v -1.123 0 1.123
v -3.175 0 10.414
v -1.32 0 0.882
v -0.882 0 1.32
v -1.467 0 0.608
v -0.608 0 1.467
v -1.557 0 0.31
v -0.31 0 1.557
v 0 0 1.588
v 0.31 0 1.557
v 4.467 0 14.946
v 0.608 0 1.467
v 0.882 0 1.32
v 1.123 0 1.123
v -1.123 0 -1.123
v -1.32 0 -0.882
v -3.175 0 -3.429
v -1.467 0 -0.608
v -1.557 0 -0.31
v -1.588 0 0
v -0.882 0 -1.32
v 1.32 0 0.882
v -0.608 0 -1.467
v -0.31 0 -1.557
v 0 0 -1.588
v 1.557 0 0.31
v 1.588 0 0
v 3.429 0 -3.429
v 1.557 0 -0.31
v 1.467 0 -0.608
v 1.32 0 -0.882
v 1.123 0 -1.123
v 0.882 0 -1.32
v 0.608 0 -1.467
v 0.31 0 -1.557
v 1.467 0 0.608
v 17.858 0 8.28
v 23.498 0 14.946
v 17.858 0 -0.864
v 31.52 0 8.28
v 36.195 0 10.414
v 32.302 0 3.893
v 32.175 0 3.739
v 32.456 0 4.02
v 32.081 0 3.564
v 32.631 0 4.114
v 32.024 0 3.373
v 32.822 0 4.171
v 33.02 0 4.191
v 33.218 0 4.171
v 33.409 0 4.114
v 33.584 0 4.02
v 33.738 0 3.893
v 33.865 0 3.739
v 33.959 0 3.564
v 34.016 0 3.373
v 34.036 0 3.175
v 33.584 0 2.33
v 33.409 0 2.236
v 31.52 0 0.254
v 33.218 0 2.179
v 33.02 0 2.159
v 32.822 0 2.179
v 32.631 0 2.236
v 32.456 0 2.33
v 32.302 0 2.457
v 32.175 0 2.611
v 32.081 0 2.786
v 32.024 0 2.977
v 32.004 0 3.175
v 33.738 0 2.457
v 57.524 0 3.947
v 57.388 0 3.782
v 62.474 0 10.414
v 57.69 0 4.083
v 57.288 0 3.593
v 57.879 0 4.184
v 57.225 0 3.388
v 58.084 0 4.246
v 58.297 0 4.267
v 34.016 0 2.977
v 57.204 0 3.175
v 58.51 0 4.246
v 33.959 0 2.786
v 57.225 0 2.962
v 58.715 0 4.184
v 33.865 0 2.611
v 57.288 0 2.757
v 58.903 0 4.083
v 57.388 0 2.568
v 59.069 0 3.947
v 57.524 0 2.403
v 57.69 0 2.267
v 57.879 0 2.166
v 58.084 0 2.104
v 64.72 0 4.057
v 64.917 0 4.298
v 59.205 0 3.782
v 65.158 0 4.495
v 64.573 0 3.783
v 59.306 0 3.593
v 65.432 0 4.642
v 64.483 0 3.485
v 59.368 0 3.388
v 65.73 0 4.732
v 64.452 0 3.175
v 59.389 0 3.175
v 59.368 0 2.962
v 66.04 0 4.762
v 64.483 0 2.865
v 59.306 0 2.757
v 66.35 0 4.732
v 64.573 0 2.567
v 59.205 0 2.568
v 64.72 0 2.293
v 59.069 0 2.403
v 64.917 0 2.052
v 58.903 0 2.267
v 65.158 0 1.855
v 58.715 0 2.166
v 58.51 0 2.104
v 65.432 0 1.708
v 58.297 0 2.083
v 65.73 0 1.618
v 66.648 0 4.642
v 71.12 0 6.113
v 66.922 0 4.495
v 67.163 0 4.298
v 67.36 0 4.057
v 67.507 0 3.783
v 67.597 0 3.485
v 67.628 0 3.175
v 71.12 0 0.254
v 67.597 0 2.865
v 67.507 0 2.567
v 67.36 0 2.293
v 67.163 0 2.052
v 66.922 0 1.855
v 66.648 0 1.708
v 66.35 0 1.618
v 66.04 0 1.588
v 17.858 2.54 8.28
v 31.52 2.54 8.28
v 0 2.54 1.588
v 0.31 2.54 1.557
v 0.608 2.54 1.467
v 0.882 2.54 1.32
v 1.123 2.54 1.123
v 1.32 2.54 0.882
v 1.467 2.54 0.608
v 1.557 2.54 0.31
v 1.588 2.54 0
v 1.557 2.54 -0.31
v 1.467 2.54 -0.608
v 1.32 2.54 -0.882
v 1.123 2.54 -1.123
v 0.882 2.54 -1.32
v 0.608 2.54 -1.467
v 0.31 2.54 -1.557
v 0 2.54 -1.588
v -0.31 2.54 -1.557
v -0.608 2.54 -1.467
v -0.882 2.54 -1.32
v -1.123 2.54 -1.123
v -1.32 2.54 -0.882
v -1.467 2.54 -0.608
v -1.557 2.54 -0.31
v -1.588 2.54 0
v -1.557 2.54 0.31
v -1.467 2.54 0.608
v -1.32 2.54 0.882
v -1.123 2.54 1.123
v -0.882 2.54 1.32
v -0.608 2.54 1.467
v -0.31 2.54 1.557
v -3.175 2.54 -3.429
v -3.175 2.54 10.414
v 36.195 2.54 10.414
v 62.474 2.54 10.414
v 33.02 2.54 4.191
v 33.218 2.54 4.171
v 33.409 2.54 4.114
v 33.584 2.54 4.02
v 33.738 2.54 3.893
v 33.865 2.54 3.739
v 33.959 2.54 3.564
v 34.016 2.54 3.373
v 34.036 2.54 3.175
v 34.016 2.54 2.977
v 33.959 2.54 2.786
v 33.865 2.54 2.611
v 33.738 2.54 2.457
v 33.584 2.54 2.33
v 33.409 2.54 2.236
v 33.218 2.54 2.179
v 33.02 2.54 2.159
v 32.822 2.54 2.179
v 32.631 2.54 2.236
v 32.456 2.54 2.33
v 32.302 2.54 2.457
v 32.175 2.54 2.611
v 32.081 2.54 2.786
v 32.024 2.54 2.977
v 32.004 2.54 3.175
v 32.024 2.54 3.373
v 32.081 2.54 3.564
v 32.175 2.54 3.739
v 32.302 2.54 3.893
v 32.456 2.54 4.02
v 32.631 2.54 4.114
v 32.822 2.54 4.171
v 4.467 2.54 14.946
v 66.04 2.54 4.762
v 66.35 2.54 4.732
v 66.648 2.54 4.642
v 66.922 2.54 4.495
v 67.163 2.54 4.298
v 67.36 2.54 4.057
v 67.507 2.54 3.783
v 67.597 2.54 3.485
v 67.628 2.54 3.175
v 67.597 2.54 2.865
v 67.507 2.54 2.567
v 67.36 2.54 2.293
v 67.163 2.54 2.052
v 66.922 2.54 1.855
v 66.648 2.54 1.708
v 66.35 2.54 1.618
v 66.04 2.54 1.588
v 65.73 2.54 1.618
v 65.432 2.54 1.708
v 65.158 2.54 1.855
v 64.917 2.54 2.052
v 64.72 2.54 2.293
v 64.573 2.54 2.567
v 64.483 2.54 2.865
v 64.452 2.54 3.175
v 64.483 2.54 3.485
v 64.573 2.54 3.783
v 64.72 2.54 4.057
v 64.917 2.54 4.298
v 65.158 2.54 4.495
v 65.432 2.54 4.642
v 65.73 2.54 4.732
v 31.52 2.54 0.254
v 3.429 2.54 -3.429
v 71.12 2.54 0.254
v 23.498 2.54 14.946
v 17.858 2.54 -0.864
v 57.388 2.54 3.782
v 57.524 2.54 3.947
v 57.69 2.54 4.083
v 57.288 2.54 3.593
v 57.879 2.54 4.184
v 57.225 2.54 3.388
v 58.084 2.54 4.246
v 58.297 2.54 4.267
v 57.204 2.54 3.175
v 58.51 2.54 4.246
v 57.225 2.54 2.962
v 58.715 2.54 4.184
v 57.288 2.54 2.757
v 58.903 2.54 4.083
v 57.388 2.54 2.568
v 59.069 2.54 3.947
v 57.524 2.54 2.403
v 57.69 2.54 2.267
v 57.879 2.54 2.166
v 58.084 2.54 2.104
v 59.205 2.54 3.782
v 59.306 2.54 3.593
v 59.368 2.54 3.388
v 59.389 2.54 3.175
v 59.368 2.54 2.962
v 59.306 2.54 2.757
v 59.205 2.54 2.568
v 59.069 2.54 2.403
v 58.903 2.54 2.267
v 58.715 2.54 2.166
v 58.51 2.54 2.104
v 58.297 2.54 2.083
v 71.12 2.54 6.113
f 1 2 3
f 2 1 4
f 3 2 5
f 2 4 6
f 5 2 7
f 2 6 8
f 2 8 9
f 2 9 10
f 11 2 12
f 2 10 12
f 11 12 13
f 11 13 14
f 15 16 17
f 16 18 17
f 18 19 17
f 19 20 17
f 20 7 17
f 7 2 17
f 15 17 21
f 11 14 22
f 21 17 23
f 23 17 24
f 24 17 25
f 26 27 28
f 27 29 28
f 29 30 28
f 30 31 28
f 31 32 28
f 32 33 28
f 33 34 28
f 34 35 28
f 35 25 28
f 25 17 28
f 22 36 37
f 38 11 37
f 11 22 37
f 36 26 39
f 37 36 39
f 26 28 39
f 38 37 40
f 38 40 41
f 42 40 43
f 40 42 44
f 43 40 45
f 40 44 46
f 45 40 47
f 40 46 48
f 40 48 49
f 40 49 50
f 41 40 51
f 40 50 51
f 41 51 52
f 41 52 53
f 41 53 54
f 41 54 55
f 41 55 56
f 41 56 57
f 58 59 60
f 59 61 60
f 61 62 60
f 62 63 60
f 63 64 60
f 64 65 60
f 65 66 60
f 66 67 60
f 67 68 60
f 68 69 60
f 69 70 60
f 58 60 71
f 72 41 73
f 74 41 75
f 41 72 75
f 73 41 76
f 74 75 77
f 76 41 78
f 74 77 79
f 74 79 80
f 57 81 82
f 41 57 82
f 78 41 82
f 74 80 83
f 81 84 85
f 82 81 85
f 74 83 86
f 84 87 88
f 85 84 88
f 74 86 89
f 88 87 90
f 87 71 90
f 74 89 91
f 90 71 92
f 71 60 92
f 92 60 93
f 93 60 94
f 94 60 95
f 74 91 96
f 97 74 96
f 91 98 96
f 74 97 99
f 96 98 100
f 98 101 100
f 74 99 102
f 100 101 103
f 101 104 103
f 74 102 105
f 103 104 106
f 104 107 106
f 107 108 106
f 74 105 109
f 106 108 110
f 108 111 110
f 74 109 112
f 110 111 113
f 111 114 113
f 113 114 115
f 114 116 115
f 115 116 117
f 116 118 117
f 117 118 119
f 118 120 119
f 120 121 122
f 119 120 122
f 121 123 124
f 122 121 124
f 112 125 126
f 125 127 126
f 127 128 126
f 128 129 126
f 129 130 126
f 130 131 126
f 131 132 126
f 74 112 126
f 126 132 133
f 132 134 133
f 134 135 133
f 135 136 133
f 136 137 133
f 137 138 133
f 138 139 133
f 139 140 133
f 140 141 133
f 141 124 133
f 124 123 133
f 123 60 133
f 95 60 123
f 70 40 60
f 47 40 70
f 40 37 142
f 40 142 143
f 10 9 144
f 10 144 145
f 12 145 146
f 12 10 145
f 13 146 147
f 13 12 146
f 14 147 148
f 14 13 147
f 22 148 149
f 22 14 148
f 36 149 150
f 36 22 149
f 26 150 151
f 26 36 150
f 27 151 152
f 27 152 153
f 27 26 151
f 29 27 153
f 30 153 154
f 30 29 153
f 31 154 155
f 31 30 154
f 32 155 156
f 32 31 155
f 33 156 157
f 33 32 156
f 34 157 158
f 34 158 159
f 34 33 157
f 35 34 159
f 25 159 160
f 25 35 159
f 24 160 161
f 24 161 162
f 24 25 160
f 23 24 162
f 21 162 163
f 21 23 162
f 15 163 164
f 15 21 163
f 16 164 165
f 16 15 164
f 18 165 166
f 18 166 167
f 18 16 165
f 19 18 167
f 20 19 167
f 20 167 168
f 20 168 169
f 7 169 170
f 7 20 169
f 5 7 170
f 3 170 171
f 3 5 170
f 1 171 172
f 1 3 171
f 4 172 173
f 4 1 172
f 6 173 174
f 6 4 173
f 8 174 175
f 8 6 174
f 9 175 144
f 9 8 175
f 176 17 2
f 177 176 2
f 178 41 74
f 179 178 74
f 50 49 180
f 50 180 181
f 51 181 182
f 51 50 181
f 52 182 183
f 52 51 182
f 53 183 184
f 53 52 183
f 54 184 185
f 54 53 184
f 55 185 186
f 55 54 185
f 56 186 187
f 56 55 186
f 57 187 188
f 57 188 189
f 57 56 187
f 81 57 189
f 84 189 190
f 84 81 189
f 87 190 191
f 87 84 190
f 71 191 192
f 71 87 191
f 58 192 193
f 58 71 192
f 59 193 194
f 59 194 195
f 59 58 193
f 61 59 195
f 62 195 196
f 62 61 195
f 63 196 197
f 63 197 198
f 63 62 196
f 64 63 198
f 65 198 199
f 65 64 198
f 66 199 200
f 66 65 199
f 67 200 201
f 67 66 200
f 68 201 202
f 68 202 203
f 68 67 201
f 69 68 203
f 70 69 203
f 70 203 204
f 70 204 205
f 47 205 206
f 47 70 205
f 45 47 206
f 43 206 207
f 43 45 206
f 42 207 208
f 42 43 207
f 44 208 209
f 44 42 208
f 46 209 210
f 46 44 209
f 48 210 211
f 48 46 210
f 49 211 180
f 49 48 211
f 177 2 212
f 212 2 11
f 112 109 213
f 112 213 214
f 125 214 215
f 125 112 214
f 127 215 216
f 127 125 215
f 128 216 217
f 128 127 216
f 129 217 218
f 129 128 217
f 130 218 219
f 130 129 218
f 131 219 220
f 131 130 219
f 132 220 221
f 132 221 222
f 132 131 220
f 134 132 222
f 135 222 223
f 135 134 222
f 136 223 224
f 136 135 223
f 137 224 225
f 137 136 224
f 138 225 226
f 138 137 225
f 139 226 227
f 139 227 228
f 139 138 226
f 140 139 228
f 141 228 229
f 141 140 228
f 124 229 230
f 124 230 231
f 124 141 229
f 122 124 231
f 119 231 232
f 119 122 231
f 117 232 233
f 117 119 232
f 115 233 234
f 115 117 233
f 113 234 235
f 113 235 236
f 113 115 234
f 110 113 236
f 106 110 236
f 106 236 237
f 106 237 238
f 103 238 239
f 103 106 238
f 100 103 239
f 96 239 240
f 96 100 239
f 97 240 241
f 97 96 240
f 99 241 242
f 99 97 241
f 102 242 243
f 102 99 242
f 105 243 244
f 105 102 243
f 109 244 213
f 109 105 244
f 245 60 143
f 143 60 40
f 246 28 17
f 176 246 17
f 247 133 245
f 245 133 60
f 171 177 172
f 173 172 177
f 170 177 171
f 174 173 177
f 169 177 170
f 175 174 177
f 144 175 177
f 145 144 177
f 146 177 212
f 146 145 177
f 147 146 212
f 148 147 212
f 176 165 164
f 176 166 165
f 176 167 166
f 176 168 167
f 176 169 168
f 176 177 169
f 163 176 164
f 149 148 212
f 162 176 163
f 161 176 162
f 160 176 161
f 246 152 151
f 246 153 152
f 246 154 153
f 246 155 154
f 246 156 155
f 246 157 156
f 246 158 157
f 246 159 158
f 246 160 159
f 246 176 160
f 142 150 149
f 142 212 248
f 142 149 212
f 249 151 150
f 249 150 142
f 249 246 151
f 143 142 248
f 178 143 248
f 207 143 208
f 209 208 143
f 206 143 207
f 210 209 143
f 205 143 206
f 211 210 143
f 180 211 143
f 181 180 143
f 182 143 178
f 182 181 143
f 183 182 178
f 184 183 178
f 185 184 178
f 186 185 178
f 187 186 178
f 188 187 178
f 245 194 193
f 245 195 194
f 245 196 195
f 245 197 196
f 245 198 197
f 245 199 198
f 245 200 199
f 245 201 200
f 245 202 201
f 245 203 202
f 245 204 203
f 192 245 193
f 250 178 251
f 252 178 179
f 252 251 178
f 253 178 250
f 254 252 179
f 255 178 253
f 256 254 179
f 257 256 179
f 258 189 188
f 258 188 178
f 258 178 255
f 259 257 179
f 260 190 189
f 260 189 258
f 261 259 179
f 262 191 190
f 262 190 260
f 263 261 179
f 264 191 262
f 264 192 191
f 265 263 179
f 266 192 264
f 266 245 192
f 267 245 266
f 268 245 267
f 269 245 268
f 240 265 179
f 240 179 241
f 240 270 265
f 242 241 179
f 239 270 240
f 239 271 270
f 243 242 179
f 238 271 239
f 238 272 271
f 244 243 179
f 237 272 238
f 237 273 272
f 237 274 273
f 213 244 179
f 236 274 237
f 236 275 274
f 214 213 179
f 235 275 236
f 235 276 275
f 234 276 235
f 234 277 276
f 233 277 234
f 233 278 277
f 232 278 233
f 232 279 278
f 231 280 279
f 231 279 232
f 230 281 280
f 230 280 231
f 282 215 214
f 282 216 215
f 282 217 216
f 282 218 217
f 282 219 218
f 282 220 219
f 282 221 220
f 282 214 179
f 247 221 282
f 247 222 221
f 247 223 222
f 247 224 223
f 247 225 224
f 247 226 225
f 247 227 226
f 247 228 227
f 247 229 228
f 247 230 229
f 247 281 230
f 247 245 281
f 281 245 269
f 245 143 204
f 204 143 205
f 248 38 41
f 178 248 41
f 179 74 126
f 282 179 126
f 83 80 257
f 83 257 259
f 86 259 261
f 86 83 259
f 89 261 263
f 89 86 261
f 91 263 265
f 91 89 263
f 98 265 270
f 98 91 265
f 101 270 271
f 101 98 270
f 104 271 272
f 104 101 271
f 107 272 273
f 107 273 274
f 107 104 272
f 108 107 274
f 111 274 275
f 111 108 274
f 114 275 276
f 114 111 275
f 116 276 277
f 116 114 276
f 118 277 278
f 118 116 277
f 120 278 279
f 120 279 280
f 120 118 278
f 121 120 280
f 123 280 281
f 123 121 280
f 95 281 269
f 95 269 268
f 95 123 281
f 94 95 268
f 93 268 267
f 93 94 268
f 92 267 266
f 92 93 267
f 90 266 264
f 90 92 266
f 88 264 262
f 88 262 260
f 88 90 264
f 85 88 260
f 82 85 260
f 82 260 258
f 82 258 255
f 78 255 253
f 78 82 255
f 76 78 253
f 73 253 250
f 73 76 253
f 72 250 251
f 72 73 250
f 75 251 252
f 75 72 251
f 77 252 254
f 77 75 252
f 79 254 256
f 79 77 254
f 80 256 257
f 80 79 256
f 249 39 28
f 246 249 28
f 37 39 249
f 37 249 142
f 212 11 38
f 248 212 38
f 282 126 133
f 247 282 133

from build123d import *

# Parameters (mm, degrees)
SKETCH1_R           = 1.016
SKETCH1_R_2         = 1.5875
SKETCH1_R_3         = 1.0922
BOSS_EXTRUDE1_DEPTH = 2.54
SKETCH2_W           = 13.662102681
SKETCH2_H           = 9.772536082
CUT_EXTRUDE1_DEPTH  = 2.54


with BuildPart() as part:
    # Sketch1 → Boss-Extrude1 (new body)
    with BuildSketch(Plane(origin=(0, 0, 0), x_dir=(1, 0, 0), z_dir=(0, 1, 0))):
        Polygon((-3.175, 3.429), (-3.175, -10.414), (4.467211682, -14.946323026), (23.497546316, -14.946323026), (36.195, -10.414), (62.473953038, -10.414), (71.12, -6.112857804), (71.12, -0.254), (24.145875, -0.254), (3.429, 3.429), align=None)
        with Locations(Location((33.02, -3.175, 0), (0, 0, 270))):
            Circle(SKETCH1_R, mode=Mode.SUBTRACT)
        with Locations(Location((66.04, -3.175, 0), (0, 0, 270))):
            Circle(SKETCH1_R_2, mode=Mode.SUBTRACT)
        with Locations(Location((0, 0, 0), (0, 0, 270))):
            Circle(SKETCH1_R_2, mode=Mode.SUBTRACT)
        with Locations(Location((58.296606113, -3.175, 0), (0, 0, 270))):
            Circle(SKETCH1_R_3, mode=Mode.SUBTRACT)
    extrude(amount=BOSS_EXTRUDE1_DEPTH)

    # Sketch2 → Cut-Extrude1 (cut)
    with BuildSketch(Plane.XZ):
        with Locations((24.68894866, 3.393977835)):
            Rectangle(SKETCH2_W, SKETCH2_H)
    extrude(amount=-CUT_EXTRUDE1_DEPTH, mode=Mode.SUBTRACT)


solid = part.part
